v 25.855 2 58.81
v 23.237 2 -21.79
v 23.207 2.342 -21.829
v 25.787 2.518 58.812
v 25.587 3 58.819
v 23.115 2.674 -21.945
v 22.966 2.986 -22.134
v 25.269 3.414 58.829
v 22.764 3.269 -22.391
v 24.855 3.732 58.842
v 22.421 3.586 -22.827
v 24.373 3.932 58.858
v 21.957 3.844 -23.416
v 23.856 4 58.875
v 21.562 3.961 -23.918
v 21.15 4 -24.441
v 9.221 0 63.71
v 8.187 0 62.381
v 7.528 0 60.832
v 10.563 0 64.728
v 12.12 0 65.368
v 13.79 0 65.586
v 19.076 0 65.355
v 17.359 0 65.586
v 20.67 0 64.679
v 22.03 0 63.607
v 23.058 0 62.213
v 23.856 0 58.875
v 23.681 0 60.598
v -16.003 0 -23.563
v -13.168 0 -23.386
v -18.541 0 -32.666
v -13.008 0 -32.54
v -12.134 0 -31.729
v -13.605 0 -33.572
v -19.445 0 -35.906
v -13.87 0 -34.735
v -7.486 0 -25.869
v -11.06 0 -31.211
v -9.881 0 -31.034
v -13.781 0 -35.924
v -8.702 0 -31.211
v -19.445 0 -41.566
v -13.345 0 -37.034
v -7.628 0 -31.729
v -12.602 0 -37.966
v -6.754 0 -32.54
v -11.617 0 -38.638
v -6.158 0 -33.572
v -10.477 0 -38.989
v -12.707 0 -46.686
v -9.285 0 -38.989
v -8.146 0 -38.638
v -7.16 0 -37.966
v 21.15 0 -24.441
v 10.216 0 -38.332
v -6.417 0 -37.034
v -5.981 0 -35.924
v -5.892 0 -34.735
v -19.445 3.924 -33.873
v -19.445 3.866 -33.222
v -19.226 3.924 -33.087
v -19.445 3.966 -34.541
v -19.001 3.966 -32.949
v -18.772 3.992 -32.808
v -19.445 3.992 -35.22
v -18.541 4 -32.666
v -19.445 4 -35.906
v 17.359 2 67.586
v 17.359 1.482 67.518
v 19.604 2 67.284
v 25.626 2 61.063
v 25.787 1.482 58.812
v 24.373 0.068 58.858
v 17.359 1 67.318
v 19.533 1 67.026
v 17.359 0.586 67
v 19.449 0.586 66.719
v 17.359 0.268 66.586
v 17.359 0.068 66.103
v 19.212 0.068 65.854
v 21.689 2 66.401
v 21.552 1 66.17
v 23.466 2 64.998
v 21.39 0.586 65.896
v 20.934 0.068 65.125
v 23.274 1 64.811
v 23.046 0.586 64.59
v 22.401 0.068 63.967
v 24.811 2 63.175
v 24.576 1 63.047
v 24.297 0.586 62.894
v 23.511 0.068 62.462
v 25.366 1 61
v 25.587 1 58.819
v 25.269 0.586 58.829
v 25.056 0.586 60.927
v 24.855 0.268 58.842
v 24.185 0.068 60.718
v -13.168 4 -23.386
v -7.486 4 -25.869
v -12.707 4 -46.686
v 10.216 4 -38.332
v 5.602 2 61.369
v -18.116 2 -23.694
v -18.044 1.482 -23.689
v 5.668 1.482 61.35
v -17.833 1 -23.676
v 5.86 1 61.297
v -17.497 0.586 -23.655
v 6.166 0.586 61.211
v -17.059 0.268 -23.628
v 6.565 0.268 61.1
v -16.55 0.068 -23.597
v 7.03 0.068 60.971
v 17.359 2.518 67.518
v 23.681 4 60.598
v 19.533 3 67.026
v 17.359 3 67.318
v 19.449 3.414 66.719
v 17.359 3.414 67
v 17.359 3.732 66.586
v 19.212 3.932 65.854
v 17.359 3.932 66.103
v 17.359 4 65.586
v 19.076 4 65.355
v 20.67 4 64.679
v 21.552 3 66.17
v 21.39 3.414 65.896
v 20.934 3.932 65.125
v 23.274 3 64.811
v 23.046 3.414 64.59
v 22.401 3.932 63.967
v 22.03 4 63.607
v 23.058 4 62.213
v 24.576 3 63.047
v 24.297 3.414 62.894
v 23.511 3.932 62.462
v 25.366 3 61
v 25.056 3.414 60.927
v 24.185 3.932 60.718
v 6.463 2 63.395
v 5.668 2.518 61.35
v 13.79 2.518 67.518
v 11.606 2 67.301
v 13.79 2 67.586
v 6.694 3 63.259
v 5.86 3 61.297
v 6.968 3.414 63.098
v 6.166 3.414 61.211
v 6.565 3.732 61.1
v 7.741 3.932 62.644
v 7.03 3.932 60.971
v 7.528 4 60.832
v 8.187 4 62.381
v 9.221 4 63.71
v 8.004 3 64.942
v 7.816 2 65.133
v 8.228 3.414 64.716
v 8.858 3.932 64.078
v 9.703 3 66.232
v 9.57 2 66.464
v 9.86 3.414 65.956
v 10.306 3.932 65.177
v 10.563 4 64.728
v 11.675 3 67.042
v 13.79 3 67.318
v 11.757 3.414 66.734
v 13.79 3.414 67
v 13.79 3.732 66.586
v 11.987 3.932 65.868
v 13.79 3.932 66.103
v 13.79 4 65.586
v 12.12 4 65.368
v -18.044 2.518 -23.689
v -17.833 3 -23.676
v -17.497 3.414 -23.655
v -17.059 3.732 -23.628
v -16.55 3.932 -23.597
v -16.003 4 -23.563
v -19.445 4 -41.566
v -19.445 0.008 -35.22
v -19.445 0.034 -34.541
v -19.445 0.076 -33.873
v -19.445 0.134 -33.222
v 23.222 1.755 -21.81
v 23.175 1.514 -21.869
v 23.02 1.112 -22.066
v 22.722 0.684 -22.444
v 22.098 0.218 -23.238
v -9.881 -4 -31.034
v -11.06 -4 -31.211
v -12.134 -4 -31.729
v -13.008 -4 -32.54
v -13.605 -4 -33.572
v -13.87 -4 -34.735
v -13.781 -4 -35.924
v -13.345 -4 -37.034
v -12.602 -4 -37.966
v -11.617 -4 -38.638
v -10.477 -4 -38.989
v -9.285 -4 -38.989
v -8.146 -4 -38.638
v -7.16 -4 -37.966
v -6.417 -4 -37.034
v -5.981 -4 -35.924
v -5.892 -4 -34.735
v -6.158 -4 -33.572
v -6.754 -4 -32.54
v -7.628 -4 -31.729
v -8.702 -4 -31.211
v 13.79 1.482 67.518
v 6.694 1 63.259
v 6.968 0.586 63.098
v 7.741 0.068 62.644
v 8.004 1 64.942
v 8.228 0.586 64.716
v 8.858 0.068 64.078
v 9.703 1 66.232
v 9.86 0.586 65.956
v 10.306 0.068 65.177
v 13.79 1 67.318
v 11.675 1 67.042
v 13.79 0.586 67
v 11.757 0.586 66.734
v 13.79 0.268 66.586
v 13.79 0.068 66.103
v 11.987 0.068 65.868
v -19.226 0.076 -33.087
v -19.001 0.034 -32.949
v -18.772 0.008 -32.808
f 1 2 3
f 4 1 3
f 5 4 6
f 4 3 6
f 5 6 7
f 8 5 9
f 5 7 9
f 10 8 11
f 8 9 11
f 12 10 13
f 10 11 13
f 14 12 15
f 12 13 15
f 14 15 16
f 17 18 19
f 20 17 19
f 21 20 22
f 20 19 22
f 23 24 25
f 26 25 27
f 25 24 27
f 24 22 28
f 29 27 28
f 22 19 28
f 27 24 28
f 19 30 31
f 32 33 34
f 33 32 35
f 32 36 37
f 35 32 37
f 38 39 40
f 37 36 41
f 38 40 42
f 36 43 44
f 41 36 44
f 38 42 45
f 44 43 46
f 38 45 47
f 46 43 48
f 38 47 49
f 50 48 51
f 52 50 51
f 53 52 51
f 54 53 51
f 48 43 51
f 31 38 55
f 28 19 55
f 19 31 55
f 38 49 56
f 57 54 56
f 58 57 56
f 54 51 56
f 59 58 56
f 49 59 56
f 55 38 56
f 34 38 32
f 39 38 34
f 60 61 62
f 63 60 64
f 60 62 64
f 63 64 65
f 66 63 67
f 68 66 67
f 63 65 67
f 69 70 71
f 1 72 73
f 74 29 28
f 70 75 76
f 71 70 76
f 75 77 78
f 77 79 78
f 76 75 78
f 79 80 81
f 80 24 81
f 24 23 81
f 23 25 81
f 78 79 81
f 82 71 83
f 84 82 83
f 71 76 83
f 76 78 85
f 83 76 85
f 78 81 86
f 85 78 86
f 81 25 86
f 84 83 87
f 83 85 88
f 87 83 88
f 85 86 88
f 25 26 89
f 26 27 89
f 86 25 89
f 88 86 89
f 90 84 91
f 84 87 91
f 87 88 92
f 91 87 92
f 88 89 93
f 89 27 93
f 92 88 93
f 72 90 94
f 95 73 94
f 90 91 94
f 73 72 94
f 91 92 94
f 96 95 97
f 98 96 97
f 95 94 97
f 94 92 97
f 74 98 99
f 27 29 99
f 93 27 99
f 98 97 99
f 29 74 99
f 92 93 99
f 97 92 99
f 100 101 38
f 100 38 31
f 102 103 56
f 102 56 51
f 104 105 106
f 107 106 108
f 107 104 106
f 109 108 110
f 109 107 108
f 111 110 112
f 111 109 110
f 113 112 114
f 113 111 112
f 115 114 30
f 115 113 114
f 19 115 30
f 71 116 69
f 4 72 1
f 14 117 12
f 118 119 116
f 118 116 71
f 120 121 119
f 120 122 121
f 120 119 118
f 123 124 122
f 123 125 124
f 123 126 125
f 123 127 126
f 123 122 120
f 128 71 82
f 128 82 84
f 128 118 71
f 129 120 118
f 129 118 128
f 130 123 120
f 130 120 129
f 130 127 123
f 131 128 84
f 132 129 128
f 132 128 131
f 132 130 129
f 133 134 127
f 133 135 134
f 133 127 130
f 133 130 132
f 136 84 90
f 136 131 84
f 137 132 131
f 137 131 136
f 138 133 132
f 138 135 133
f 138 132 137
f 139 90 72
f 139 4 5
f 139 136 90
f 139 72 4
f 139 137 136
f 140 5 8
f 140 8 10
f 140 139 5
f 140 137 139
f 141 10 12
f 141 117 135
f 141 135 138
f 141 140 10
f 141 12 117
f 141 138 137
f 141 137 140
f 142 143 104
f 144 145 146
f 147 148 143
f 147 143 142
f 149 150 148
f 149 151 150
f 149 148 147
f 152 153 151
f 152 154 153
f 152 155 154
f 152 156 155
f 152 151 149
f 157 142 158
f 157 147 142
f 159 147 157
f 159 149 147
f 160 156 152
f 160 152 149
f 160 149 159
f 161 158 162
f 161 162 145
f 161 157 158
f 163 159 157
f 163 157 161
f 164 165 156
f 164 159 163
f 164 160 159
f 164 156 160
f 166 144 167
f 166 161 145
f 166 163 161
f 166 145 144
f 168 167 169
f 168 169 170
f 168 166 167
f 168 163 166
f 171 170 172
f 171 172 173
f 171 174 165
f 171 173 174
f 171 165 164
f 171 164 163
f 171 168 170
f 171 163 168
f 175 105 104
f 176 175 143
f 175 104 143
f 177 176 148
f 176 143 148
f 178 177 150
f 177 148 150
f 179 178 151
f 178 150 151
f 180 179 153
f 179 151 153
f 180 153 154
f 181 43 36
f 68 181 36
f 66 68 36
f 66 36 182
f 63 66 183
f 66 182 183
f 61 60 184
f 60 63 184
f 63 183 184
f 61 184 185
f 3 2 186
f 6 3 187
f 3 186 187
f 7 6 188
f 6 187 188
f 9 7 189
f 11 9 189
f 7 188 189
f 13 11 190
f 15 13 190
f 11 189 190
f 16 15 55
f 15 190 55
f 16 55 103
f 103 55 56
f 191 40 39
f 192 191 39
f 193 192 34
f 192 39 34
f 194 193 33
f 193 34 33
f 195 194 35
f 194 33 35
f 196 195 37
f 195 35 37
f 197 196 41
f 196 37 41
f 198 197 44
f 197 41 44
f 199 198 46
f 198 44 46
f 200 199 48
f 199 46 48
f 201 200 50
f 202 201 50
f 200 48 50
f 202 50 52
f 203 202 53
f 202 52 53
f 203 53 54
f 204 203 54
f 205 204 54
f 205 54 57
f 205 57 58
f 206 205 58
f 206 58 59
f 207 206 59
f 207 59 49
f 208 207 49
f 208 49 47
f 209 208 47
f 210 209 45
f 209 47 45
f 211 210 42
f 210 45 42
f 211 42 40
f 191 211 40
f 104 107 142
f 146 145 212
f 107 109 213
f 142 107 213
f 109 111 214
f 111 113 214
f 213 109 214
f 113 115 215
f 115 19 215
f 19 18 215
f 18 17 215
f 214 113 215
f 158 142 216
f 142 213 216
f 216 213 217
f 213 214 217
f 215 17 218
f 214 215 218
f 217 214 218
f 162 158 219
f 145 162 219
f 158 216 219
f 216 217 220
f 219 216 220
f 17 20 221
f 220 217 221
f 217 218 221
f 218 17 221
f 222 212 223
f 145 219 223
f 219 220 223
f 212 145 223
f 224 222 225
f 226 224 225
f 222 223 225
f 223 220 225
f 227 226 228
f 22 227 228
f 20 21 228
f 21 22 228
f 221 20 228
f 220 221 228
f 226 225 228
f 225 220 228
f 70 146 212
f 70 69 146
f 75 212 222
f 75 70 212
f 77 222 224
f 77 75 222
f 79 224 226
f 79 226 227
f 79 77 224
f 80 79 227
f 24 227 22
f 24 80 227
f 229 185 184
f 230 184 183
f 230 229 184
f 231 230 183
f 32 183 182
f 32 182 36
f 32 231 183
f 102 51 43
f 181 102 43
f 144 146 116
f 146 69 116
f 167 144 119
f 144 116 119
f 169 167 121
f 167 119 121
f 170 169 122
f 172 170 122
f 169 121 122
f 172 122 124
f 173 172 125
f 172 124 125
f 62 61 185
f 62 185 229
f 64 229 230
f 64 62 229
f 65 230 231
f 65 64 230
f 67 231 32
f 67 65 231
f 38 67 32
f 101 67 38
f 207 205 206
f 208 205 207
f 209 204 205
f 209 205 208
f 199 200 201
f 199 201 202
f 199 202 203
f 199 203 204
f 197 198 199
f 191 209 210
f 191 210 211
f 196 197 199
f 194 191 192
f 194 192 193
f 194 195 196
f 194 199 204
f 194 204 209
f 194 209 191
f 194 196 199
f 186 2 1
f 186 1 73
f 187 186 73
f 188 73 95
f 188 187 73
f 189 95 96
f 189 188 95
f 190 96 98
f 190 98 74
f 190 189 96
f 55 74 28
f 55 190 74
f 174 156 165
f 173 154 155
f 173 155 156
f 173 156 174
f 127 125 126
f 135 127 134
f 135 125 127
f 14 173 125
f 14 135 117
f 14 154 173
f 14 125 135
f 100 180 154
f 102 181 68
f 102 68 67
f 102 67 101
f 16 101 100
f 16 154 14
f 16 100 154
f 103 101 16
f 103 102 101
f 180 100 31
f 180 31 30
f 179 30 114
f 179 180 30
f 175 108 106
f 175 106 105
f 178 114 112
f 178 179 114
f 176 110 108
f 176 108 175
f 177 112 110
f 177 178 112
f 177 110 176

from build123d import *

# Parameters (mm, degrees)
BOSS_EXTRUDE1_DEPTH = 4
FILLET5_R           = 2
SKETCH3_R           = 4
BOSS_EXTRUDE2_DEPTH = 4
CUT_EXTRUDE1_START  = -8
CUT_EXTRUDE1_DEPTH  = 8
CUT_EXTRUDE2_REACH  = 74.805


with BuildPart() as part:
    # Sketch2 → Boss-Extrude1 (new body)
    with BuildSketch(Plane(origin=(0, 0, 0), x_dir=(1, 0, 0), z_dir=(0, 1, 0))):
        with BuildLine():
            Line((-19.444698737, 54.4597806), (-19.444698737, 28.4597806))
            Line((-19.444698737, 28.4597806), (5.602062826, -61.368686618))
            ThreePointArc((5.602062826, -61.368686618), (8.649467973, -65.855333302), (13.789742047, -67.585726043))
            Line((13.789742047, -67.585726043), (17.359306877, -67.585726043))
            ThreePointArc((17.359306877, -67.585726043), (23.466476793, -64.997787917), (25.854828389, -58.809837951))
            Line((25.854828389, -58.809837951), (22.177110502, 54.439455621))
            Line((22.177110502, 54.439455621), (22.802984938, 54.4597806))
            Line((22.802984938, 54.4597806), (-19.444698737, 54.4597806))
        make_face()
    extrude(amount=BOSS_EXTRUDE1_DEPTH)

    # Fillet5
    fillet5_edges = [part.edges().sort_by_distance(p)[0] for p in [
        (24.015969445, 4, 2.185191165),
        (23.466476793, 4, 64.997787917),
        (15.574524462, 4, 67.585726043),
        (8.649467973, 4, 65.855333302),
        (24.015969445, 0, 2.185191165),
        (23.466476793, 0, 64.997787917),
        (15.574524462, 0, 67.585726043),
        (8.649467973, 0, 65.855333302),
        (-19.444698737, 2, -28.4597806),
        (-6.921317955, 4, 16.454453009),
        (-6.921317955, 0, 16.454453009),
    ]]
    fillet(fillet5_edges, radius=FILLET5_R - 0.0001)  # a hair under: the kernel refuses the full size

    # Sketch3 → Boss-Extrude2 (add)
    with BuildSketch(Plane.XZ):
        with Locations(Location((-9.881069751, -35.033682073, 0), (0, 0, 90))):
            Circle(SKETCH3_R)
    extrude(amount=BOSS_EXTRUDE2_DEPTH)

    # Sketch4 → Cut-Extrude1 (cut)
    with BuildSketch(Plane(origin=(0, 4, 0), x_dir=(1, 0, 0), z_dir=(0, 1, 0)).offset(CUT_EXTRUDE1_START)):
        Polygon((23.237390651, 21.78986649), (-2.479011749, 54.4597806), (-19.444698737, 41.566075464), (-32.323067486, 58.511582656), (23.237390651, 102.246472628), (62.340489493, 52.570205291), align=None)
    extrude(amount=CUT_EXTRUDE1_DEPTH, mode=Mode.SUBTRACT)

    # Sketch5 → Cut-Extrude2 (cut, up to next)
    with BuildSketch(Plane(origin=(0, 4, 0), x_dir=(1, 0, 0), z_dir=(0, 1, 0)), mode=Mode.PRIVATE) as cut_extrude2_sk1:
        Polygon((10.216290077, 38.331769621), (-12.707477704, 46.686277287), (-5.274739107, 62.107031808), align=None)
    cut_extrude2_tool1 = extrude(cut_extrude2_sk1.sketch, amount=-CUT_EXTRUDE2_REACH, mode=Mode.PRIVATE) & part.part
    # Sketch5 → Cut-Extrude2 (cut, up to next)
    with BuildSketch(Plane(origin=(0, 4, 0), x_dir=(1, 0, 0), z_dir=(0, 1, 0)), mode=Mode.PRIVATE) as cut_extrude2_sk2:
        Polygon((-19.444698737, 33.221694621), (-7.48638486, 25.86937143), (-13.167620162, 23.386461187), (-19.9430193, 23.807293431), align=None)
    cut_extrude2_tool2 = extrude(cut_extrude2_sk2.sketch, amount=-CUT_EXTRUDE2_REACH, mode=Mode.PRIVATE) & part.part
    add(cut_extrude2_tool1.solids().sort_by_distance((-2.588642, 4, -49.041693))[0], mode=Mode.SUBTRACT)
    add(cut_extrude2_tool2.solids().sort_by_distance((-15.327917, 4, -27.167771))[0], mode=Mode.SUBTRACT)


solid = part.part
